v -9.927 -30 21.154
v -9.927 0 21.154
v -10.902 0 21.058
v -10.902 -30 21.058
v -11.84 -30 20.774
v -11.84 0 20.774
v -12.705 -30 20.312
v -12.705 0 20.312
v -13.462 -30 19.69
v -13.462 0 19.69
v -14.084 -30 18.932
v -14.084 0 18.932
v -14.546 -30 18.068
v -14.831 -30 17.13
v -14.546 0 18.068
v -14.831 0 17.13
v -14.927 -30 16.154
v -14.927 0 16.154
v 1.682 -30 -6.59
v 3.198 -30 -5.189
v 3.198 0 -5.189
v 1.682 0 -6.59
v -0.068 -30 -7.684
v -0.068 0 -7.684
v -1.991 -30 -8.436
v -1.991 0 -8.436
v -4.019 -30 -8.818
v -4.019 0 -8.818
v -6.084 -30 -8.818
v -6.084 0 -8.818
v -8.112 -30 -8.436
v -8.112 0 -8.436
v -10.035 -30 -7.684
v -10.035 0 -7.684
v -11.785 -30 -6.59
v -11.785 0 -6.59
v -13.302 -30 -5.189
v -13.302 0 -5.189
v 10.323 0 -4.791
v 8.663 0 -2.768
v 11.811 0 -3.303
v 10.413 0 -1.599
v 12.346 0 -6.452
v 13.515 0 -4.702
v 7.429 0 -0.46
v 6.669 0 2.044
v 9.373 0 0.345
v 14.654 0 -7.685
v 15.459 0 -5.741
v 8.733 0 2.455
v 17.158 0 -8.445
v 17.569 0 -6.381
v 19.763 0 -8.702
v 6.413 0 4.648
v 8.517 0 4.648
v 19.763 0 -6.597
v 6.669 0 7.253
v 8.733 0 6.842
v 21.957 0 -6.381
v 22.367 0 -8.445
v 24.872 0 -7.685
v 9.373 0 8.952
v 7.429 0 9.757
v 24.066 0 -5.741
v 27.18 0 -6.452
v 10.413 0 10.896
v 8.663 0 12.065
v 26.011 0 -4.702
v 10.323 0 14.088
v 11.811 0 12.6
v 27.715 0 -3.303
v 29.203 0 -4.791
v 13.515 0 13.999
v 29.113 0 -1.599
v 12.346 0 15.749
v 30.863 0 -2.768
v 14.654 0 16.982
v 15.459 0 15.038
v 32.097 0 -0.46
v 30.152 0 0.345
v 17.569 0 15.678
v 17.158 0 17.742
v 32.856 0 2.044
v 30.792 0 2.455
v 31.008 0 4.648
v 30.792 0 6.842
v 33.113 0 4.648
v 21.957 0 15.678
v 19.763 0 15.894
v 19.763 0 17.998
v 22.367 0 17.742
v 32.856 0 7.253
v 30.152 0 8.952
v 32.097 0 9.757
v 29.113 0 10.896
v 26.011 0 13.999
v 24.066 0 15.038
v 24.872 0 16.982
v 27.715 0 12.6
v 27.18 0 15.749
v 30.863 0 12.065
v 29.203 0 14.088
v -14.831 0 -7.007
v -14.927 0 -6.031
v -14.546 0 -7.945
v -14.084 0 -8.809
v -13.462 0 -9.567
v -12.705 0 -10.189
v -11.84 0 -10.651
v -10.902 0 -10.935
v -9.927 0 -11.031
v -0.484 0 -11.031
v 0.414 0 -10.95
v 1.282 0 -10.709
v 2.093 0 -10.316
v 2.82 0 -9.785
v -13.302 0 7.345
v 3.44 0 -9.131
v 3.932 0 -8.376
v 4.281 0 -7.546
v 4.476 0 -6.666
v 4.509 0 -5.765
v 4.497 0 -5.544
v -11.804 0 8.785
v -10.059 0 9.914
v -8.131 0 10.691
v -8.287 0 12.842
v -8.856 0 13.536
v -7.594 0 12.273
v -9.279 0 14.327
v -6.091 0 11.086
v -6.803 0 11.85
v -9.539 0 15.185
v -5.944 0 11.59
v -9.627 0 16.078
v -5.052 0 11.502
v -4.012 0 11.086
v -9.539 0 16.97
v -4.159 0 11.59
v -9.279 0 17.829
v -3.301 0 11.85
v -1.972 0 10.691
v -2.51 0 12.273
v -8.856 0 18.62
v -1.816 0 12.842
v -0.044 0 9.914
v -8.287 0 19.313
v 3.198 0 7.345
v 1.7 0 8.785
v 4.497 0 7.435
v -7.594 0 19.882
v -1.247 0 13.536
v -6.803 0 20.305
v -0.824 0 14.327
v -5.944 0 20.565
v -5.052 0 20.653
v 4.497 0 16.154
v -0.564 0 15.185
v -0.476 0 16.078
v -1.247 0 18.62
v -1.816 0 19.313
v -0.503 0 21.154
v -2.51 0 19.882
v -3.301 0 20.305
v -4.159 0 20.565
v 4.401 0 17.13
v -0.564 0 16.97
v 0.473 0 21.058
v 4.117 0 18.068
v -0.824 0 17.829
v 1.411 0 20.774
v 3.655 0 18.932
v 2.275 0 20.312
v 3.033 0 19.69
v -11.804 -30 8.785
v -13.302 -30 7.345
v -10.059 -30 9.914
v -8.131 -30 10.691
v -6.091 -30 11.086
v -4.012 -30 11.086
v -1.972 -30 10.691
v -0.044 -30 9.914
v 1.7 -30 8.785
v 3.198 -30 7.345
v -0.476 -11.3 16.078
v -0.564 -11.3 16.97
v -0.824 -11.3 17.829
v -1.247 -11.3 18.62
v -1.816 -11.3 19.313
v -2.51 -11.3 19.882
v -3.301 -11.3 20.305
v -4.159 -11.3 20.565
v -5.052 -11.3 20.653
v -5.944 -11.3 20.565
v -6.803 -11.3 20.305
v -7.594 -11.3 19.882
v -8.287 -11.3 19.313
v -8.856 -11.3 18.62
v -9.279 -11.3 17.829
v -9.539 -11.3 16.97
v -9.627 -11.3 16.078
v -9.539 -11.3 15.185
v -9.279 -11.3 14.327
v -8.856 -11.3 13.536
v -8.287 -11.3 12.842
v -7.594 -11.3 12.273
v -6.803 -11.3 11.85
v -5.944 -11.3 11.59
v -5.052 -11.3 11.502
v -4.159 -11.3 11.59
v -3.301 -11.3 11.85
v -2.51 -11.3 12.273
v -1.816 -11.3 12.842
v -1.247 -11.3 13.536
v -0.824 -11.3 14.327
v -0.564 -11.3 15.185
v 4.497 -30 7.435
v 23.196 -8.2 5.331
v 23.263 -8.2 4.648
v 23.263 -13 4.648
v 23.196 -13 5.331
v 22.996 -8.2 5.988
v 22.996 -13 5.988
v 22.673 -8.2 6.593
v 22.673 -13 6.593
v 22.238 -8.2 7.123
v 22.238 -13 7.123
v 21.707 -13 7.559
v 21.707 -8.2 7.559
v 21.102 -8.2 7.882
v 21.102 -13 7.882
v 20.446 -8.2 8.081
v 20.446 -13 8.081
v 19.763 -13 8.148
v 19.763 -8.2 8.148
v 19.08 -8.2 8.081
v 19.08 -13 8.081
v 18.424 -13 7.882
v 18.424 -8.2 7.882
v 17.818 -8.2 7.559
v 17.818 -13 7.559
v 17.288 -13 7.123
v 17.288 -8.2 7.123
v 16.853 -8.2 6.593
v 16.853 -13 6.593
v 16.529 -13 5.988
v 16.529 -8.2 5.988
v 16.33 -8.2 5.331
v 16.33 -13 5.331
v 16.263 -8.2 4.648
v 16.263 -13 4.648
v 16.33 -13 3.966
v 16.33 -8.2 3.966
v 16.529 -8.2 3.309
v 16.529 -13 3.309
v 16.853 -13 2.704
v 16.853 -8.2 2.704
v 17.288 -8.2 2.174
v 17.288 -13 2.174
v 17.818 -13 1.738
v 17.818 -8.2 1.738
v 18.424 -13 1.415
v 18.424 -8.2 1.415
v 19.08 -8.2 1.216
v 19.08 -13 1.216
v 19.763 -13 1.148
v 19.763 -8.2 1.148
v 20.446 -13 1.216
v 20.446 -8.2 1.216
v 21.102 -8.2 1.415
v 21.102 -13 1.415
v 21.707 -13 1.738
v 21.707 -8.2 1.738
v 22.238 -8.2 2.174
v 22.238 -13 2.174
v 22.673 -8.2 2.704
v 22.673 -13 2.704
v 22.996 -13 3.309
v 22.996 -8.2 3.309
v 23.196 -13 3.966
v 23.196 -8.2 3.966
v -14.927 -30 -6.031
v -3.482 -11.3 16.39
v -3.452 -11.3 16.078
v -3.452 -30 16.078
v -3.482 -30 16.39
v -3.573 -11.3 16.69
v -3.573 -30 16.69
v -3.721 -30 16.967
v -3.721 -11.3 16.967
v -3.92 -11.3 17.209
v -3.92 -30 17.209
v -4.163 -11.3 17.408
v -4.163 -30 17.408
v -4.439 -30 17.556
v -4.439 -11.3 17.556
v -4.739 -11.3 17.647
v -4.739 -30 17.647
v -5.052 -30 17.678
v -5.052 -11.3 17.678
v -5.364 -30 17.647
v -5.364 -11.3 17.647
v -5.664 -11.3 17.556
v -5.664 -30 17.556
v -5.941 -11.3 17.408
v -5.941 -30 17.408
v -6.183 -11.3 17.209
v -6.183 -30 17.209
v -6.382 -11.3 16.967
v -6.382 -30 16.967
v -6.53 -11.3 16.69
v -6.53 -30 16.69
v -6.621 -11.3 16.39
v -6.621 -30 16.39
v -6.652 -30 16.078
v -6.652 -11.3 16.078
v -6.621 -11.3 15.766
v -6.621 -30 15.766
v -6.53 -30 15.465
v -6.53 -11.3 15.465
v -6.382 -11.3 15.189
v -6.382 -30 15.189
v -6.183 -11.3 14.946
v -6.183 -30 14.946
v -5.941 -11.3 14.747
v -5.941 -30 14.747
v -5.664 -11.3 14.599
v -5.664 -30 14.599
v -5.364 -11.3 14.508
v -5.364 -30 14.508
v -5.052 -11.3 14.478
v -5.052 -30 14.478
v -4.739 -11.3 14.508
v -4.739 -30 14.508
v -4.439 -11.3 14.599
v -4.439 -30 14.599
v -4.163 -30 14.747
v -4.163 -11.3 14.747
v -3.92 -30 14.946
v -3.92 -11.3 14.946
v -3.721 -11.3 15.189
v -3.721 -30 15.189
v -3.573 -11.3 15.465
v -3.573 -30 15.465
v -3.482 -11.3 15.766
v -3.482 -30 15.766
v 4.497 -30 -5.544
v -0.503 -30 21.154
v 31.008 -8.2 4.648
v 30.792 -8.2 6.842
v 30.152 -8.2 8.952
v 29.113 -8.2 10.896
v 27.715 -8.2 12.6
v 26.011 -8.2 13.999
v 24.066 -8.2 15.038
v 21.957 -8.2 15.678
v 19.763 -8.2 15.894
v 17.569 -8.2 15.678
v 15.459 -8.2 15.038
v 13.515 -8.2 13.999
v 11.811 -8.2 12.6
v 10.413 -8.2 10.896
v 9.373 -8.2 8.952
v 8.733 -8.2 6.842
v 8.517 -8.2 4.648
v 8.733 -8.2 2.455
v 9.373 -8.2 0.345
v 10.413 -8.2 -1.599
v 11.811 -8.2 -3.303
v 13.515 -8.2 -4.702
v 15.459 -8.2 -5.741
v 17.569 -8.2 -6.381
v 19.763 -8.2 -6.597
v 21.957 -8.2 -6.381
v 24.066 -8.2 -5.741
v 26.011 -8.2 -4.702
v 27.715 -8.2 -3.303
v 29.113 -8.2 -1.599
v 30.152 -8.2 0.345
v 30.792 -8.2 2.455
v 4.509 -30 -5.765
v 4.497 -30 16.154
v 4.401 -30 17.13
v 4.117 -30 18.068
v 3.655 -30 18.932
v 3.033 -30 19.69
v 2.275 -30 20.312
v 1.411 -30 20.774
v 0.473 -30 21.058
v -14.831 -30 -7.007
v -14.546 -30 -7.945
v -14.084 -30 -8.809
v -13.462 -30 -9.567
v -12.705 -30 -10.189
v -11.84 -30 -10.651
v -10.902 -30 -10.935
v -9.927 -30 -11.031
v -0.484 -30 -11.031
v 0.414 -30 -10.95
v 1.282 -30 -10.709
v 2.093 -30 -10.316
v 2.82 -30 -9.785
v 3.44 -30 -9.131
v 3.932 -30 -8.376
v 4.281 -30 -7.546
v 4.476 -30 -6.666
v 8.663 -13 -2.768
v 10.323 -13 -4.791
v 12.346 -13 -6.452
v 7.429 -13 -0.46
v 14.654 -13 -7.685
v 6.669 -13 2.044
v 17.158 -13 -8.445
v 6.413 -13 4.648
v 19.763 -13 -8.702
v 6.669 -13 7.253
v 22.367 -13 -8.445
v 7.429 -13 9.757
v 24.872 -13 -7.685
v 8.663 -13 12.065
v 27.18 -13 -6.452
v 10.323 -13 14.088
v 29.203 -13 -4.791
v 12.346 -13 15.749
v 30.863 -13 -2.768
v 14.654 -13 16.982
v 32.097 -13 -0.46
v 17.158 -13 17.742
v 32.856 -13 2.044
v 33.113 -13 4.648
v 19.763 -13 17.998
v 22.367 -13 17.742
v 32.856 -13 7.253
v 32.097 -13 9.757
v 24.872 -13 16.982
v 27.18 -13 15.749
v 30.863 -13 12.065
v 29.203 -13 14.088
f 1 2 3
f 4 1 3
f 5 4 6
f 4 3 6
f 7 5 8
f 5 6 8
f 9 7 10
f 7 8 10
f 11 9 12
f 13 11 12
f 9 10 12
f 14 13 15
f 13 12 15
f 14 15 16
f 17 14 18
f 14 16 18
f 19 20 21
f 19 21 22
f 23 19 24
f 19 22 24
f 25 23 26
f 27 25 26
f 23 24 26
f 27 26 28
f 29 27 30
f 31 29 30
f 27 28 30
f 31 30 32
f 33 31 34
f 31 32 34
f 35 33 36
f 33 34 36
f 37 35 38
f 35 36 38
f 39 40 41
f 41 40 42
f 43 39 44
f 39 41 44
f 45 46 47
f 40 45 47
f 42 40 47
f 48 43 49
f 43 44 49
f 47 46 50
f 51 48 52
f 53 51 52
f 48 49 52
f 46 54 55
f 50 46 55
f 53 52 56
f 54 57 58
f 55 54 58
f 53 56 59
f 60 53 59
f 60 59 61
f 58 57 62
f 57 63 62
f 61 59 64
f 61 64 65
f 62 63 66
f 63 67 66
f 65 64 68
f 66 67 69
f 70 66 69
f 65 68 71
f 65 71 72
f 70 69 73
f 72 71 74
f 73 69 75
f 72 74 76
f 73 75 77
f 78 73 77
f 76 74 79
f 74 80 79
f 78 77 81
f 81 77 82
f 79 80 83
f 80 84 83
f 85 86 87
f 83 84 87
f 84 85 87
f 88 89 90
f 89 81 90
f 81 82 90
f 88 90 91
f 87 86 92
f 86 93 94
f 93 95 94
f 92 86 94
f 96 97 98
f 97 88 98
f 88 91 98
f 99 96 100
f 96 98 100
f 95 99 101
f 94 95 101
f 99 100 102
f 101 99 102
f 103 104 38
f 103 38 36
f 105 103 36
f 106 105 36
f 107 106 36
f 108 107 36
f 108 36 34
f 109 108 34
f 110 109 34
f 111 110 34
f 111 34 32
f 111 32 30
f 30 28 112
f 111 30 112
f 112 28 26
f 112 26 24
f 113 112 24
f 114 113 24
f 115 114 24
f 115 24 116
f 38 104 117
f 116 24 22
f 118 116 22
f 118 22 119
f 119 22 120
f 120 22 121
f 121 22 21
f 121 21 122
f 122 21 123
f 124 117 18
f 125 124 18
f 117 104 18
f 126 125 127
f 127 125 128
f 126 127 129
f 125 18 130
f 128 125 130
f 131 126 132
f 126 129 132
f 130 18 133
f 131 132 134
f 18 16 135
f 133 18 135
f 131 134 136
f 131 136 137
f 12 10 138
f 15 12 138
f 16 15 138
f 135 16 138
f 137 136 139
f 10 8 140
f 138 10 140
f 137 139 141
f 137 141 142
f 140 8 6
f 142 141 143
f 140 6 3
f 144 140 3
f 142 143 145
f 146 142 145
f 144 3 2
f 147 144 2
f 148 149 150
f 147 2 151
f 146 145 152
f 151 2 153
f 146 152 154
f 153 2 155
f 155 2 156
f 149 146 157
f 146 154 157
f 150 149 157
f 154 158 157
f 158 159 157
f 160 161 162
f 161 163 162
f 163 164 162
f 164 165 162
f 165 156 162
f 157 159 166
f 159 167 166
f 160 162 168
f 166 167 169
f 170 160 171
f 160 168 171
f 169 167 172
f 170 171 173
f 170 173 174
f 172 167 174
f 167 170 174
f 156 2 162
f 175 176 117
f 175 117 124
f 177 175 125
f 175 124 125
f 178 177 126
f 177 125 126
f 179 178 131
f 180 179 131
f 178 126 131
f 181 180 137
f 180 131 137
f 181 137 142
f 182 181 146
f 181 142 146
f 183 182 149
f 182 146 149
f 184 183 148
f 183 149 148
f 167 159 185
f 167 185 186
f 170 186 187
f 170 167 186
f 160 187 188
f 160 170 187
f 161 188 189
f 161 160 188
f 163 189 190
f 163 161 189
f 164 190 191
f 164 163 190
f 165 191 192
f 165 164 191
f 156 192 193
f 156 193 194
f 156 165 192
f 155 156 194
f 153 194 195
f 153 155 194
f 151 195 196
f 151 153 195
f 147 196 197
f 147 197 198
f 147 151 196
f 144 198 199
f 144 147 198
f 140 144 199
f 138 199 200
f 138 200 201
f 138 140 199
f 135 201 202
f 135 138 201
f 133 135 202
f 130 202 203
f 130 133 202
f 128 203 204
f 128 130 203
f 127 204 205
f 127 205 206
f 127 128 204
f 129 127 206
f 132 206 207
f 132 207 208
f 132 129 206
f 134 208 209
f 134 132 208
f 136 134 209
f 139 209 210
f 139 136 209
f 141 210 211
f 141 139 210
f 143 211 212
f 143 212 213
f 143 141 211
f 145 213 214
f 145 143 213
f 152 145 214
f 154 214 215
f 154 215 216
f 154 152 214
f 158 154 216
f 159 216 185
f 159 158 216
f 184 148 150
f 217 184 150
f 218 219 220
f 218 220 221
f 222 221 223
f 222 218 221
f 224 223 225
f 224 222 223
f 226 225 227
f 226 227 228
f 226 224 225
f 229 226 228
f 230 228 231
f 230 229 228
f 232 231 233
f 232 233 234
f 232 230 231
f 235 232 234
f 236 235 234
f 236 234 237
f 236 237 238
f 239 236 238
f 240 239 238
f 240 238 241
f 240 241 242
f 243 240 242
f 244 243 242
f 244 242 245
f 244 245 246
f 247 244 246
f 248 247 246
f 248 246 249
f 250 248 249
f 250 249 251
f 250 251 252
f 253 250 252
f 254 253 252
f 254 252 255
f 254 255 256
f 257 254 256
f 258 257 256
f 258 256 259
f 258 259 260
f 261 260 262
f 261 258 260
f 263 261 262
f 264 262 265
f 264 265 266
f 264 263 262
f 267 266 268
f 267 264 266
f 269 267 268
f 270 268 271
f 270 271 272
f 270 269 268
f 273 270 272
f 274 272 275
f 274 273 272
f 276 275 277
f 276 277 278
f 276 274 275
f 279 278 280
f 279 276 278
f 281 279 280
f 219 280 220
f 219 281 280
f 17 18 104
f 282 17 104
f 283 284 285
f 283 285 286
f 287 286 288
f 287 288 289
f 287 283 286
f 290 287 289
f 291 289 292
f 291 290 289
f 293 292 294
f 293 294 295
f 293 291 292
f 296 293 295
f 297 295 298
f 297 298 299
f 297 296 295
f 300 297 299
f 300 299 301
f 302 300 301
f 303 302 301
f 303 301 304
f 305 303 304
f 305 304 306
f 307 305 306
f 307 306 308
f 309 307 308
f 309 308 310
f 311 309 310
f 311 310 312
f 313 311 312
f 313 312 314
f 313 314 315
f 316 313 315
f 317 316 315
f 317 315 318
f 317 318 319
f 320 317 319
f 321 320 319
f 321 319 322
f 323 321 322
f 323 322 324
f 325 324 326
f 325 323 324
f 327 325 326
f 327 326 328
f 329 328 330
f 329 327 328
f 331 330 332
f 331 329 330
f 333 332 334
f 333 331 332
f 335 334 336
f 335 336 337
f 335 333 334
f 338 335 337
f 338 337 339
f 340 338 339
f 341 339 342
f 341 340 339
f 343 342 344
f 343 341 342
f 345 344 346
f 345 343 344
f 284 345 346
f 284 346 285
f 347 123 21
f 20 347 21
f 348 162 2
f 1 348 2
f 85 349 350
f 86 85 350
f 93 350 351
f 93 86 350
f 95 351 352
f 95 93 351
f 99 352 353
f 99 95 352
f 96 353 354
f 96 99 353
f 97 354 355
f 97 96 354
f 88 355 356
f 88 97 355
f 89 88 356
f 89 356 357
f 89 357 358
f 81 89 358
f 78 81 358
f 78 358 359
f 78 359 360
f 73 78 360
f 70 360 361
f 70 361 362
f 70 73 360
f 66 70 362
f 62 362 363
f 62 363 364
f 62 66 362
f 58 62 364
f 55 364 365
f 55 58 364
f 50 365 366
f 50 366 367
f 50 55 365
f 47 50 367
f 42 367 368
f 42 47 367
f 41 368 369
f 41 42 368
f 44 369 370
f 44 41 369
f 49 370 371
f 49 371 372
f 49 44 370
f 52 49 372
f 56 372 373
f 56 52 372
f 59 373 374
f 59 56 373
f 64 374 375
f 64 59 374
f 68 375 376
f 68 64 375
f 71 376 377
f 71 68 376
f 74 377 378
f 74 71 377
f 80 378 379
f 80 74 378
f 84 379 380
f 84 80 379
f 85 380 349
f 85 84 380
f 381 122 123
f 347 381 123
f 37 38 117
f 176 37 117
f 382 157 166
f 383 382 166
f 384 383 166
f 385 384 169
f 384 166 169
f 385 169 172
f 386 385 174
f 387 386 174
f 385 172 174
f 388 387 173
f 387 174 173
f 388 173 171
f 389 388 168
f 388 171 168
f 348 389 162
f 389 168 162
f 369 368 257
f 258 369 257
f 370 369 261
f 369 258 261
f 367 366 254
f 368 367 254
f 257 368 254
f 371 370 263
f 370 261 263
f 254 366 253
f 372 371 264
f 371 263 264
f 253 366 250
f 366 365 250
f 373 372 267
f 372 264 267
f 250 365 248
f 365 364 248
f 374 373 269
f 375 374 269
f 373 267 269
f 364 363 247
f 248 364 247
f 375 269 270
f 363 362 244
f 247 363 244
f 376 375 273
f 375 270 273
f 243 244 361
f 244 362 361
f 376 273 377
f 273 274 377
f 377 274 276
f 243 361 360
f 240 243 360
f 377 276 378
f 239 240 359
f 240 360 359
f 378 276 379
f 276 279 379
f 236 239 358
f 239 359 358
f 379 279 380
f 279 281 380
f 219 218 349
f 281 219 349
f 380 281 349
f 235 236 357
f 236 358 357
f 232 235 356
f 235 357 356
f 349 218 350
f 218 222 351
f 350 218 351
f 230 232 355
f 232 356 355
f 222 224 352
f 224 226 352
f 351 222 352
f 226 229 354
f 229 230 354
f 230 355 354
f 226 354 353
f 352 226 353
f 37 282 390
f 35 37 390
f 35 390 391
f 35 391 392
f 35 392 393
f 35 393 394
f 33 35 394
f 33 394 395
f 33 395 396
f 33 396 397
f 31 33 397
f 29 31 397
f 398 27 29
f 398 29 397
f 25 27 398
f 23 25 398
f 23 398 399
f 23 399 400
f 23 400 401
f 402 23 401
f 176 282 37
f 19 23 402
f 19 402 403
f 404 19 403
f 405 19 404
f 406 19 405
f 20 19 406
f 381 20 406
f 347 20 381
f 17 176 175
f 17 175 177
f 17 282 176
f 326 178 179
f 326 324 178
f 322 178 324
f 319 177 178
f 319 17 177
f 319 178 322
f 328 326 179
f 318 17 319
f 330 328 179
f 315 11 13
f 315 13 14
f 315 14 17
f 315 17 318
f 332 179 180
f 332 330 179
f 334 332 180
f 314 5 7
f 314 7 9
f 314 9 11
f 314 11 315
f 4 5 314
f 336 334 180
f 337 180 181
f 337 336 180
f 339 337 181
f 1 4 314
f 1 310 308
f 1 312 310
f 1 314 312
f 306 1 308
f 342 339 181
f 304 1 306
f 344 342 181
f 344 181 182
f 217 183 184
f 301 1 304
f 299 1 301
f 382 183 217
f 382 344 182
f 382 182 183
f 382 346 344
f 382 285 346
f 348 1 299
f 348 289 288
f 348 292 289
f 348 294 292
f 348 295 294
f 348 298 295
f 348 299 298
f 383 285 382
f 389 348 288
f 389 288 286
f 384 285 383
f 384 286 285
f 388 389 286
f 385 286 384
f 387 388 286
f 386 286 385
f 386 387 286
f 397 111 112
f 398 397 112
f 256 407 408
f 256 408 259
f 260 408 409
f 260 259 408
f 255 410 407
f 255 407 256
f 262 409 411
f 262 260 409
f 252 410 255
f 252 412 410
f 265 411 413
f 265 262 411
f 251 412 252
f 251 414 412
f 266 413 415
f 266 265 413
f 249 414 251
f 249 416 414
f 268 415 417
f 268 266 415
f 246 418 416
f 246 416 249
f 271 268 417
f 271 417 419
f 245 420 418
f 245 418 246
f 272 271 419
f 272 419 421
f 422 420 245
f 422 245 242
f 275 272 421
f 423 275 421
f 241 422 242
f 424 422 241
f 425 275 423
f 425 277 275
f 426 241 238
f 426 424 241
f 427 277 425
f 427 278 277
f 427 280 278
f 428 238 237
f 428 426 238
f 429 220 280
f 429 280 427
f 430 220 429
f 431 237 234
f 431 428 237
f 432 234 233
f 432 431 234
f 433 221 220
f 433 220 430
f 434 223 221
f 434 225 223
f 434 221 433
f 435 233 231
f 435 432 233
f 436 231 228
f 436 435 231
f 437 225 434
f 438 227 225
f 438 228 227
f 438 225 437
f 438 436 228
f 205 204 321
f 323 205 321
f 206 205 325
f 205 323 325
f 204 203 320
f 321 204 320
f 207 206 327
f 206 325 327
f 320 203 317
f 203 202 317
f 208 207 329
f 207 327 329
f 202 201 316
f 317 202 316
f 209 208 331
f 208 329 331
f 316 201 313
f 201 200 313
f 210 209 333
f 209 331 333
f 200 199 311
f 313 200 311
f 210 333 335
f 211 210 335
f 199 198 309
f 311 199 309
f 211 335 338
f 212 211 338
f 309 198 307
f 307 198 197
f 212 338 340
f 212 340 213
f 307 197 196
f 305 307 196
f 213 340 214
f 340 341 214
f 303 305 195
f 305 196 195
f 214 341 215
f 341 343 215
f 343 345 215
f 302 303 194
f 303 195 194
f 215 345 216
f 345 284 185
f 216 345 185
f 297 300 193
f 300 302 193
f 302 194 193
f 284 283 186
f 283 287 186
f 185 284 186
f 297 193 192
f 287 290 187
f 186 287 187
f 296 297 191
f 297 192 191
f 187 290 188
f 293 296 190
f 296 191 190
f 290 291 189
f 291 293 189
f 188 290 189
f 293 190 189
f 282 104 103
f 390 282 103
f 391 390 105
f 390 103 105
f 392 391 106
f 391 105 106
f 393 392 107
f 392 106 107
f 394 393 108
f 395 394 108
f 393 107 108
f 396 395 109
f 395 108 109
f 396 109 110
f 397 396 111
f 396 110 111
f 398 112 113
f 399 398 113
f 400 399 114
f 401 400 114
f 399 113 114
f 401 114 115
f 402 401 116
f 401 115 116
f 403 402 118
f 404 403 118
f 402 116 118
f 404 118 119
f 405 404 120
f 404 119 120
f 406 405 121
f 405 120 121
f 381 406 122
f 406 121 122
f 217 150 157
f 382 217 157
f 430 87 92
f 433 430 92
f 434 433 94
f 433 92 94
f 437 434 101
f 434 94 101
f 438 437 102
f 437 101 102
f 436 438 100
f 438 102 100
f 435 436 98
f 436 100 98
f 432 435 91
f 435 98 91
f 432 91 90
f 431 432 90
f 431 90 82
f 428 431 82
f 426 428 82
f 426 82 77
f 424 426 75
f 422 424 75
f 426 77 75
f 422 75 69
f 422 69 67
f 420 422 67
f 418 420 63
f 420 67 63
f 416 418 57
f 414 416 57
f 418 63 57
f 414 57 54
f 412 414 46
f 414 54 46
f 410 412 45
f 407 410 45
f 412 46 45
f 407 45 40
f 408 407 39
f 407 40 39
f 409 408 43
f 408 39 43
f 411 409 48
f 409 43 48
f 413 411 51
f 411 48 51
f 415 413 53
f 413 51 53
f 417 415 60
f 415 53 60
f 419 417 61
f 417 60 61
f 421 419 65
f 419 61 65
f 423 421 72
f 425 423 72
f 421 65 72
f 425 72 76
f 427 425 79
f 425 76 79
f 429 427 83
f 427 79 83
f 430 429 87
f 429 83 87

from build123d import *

# Parameters (mm, degrees)
F0_R     = 4.5755719827
F0_R_2   = 1.6
F1_DEPTH = 30
F2_R     = 13.35
F2_R_2   = 11.2454943051
F2_R_3   = 3.5
F3_DEPTH = 13
F4_DEPTH = 8.2
F5_DEPTH = 11.3


# Not quite as in the source:
# - a feature names something its author has since deleted; it is built from what else it names


with BuildPart() as f1:
    # F0 (on Front) → F1 (new body)
    with BuildSketch(Plane.XZ):
        with BuildLine():
            ThreePointArc((3.1984001178, -5.1894447684), (-5.0515998822, -8.8665109514), (-13.3015998822, -5.1894447684))
            Line((-13.3015998822, -5.1894447684), (-13.3015998822, 7.3447863489))
            ThreePointArc((-13.3015998822, 7.3447863489), (-5.0515998822, 11.1360002928), (3.1984001178, 7.3447863489))
            Line((3.1984001178, 7.3447863489), (4.4973706827, 7.4353506115))
            Line((4.4973706827, 7.4353506115), (4.4973706827, 16.1542760953))
            ThreePointArc((4.4973706827, 16.1542760953), (3.0329045886, 19.6898100013), (-0.5026293173, 21.1542760953))
            Line((-0.5026293173, 21.1542760953), (-9.9268148168, 21.1542760953))
            ThreePointArc((-9.9268148168, 21.1542760953), (-13.4623487228, 19.6898100013), (-14.9268148168, 16.1542760953))
            Line((-14.9268148168, 16.1542760953), (-14.9268148168, -6.0313575723))
            ThreePointArc((-14.9268148168, -6.0313575723), (-13.4623487228, -9.5668914783), (-9.9268148168, -11.0313575723))
            Line((-9.9268148168, -11.0313575723), (-0.4837697949, -11.0313575723))
            ThreePointArc((-0.4837697949, -11.0313575723), (3.1445739305, -9.4715787586), (4.5091521871, -5.7654062964))
            Line((4.5091521871, -5.7654062964), (4.4973706827, -5.5442224257))
            Line((4.4973706827, -5.5442224257), (3.1984001178, -5.1894447684))
        make_face()
        with Locations((-5.0515998822, 16.0776707903)):
            Circle(F0_R, mode=Mode.SUBTRACT)
        with Locations((-5.0515998822, 16.0776707903)):
            Circle(F0_R)
        with Locations((-5.0515998822, 16.0776707903)):
            Circle(F0_R_2, mode=Mode.SUBTRACT)
    extrude(amount=F1_DEPTH)

    # F0 (on Front) → F5 (cut)
    with BuildSketch(Plane.XZ):
        with Locations((-5.0515998822, 16.0776707903)):
            Circle(F0_R)
        with Locations((-5.0515998822, 16.0776707903)):
            Circle(F0_R_2, mode=Mode.SUBTRACT)
    extrude(amount=F5_DEPTH, mode=Mode.SUBTRACT)


with BuildPart() as f3:
    # F2 (on Front) → F3 (new body)
    with BuildSketch(Plane.XZ):
        with Locations((19.7629034519, 4.6483911574)):
            Circle(F2_R)
        with Locations((19.7629034519, 4.6483911574)):
            Circle(F2_R_2, mode=Mode.SUBTRACT)
        with Locations((19.7629034519, 4.6483911574)):
            Circle(F2_R_2)
        with Locations((19.7629034519, 4.6483911574)):
            Circle(F2_R_3, mode=Mode.SUBTRACT)
    extrude(amount=F3_DEPTH)

    # F2 (on Front) → F4 (cut)
    with BuildSketch(Plane.XZ):
        with Locations((19.7629034519, 4.6483911574)):
            Circle(F2_R_2)
        with Locations((19.7629034519, 4.6483911574)):
            Circle(F2_R_3, mode=Mode.SUBTRACT)
    extrude(amount=F4_DEPTH, mode=Mode.SUBTRACT)


solid = Compound([f1.part, f3.part])
